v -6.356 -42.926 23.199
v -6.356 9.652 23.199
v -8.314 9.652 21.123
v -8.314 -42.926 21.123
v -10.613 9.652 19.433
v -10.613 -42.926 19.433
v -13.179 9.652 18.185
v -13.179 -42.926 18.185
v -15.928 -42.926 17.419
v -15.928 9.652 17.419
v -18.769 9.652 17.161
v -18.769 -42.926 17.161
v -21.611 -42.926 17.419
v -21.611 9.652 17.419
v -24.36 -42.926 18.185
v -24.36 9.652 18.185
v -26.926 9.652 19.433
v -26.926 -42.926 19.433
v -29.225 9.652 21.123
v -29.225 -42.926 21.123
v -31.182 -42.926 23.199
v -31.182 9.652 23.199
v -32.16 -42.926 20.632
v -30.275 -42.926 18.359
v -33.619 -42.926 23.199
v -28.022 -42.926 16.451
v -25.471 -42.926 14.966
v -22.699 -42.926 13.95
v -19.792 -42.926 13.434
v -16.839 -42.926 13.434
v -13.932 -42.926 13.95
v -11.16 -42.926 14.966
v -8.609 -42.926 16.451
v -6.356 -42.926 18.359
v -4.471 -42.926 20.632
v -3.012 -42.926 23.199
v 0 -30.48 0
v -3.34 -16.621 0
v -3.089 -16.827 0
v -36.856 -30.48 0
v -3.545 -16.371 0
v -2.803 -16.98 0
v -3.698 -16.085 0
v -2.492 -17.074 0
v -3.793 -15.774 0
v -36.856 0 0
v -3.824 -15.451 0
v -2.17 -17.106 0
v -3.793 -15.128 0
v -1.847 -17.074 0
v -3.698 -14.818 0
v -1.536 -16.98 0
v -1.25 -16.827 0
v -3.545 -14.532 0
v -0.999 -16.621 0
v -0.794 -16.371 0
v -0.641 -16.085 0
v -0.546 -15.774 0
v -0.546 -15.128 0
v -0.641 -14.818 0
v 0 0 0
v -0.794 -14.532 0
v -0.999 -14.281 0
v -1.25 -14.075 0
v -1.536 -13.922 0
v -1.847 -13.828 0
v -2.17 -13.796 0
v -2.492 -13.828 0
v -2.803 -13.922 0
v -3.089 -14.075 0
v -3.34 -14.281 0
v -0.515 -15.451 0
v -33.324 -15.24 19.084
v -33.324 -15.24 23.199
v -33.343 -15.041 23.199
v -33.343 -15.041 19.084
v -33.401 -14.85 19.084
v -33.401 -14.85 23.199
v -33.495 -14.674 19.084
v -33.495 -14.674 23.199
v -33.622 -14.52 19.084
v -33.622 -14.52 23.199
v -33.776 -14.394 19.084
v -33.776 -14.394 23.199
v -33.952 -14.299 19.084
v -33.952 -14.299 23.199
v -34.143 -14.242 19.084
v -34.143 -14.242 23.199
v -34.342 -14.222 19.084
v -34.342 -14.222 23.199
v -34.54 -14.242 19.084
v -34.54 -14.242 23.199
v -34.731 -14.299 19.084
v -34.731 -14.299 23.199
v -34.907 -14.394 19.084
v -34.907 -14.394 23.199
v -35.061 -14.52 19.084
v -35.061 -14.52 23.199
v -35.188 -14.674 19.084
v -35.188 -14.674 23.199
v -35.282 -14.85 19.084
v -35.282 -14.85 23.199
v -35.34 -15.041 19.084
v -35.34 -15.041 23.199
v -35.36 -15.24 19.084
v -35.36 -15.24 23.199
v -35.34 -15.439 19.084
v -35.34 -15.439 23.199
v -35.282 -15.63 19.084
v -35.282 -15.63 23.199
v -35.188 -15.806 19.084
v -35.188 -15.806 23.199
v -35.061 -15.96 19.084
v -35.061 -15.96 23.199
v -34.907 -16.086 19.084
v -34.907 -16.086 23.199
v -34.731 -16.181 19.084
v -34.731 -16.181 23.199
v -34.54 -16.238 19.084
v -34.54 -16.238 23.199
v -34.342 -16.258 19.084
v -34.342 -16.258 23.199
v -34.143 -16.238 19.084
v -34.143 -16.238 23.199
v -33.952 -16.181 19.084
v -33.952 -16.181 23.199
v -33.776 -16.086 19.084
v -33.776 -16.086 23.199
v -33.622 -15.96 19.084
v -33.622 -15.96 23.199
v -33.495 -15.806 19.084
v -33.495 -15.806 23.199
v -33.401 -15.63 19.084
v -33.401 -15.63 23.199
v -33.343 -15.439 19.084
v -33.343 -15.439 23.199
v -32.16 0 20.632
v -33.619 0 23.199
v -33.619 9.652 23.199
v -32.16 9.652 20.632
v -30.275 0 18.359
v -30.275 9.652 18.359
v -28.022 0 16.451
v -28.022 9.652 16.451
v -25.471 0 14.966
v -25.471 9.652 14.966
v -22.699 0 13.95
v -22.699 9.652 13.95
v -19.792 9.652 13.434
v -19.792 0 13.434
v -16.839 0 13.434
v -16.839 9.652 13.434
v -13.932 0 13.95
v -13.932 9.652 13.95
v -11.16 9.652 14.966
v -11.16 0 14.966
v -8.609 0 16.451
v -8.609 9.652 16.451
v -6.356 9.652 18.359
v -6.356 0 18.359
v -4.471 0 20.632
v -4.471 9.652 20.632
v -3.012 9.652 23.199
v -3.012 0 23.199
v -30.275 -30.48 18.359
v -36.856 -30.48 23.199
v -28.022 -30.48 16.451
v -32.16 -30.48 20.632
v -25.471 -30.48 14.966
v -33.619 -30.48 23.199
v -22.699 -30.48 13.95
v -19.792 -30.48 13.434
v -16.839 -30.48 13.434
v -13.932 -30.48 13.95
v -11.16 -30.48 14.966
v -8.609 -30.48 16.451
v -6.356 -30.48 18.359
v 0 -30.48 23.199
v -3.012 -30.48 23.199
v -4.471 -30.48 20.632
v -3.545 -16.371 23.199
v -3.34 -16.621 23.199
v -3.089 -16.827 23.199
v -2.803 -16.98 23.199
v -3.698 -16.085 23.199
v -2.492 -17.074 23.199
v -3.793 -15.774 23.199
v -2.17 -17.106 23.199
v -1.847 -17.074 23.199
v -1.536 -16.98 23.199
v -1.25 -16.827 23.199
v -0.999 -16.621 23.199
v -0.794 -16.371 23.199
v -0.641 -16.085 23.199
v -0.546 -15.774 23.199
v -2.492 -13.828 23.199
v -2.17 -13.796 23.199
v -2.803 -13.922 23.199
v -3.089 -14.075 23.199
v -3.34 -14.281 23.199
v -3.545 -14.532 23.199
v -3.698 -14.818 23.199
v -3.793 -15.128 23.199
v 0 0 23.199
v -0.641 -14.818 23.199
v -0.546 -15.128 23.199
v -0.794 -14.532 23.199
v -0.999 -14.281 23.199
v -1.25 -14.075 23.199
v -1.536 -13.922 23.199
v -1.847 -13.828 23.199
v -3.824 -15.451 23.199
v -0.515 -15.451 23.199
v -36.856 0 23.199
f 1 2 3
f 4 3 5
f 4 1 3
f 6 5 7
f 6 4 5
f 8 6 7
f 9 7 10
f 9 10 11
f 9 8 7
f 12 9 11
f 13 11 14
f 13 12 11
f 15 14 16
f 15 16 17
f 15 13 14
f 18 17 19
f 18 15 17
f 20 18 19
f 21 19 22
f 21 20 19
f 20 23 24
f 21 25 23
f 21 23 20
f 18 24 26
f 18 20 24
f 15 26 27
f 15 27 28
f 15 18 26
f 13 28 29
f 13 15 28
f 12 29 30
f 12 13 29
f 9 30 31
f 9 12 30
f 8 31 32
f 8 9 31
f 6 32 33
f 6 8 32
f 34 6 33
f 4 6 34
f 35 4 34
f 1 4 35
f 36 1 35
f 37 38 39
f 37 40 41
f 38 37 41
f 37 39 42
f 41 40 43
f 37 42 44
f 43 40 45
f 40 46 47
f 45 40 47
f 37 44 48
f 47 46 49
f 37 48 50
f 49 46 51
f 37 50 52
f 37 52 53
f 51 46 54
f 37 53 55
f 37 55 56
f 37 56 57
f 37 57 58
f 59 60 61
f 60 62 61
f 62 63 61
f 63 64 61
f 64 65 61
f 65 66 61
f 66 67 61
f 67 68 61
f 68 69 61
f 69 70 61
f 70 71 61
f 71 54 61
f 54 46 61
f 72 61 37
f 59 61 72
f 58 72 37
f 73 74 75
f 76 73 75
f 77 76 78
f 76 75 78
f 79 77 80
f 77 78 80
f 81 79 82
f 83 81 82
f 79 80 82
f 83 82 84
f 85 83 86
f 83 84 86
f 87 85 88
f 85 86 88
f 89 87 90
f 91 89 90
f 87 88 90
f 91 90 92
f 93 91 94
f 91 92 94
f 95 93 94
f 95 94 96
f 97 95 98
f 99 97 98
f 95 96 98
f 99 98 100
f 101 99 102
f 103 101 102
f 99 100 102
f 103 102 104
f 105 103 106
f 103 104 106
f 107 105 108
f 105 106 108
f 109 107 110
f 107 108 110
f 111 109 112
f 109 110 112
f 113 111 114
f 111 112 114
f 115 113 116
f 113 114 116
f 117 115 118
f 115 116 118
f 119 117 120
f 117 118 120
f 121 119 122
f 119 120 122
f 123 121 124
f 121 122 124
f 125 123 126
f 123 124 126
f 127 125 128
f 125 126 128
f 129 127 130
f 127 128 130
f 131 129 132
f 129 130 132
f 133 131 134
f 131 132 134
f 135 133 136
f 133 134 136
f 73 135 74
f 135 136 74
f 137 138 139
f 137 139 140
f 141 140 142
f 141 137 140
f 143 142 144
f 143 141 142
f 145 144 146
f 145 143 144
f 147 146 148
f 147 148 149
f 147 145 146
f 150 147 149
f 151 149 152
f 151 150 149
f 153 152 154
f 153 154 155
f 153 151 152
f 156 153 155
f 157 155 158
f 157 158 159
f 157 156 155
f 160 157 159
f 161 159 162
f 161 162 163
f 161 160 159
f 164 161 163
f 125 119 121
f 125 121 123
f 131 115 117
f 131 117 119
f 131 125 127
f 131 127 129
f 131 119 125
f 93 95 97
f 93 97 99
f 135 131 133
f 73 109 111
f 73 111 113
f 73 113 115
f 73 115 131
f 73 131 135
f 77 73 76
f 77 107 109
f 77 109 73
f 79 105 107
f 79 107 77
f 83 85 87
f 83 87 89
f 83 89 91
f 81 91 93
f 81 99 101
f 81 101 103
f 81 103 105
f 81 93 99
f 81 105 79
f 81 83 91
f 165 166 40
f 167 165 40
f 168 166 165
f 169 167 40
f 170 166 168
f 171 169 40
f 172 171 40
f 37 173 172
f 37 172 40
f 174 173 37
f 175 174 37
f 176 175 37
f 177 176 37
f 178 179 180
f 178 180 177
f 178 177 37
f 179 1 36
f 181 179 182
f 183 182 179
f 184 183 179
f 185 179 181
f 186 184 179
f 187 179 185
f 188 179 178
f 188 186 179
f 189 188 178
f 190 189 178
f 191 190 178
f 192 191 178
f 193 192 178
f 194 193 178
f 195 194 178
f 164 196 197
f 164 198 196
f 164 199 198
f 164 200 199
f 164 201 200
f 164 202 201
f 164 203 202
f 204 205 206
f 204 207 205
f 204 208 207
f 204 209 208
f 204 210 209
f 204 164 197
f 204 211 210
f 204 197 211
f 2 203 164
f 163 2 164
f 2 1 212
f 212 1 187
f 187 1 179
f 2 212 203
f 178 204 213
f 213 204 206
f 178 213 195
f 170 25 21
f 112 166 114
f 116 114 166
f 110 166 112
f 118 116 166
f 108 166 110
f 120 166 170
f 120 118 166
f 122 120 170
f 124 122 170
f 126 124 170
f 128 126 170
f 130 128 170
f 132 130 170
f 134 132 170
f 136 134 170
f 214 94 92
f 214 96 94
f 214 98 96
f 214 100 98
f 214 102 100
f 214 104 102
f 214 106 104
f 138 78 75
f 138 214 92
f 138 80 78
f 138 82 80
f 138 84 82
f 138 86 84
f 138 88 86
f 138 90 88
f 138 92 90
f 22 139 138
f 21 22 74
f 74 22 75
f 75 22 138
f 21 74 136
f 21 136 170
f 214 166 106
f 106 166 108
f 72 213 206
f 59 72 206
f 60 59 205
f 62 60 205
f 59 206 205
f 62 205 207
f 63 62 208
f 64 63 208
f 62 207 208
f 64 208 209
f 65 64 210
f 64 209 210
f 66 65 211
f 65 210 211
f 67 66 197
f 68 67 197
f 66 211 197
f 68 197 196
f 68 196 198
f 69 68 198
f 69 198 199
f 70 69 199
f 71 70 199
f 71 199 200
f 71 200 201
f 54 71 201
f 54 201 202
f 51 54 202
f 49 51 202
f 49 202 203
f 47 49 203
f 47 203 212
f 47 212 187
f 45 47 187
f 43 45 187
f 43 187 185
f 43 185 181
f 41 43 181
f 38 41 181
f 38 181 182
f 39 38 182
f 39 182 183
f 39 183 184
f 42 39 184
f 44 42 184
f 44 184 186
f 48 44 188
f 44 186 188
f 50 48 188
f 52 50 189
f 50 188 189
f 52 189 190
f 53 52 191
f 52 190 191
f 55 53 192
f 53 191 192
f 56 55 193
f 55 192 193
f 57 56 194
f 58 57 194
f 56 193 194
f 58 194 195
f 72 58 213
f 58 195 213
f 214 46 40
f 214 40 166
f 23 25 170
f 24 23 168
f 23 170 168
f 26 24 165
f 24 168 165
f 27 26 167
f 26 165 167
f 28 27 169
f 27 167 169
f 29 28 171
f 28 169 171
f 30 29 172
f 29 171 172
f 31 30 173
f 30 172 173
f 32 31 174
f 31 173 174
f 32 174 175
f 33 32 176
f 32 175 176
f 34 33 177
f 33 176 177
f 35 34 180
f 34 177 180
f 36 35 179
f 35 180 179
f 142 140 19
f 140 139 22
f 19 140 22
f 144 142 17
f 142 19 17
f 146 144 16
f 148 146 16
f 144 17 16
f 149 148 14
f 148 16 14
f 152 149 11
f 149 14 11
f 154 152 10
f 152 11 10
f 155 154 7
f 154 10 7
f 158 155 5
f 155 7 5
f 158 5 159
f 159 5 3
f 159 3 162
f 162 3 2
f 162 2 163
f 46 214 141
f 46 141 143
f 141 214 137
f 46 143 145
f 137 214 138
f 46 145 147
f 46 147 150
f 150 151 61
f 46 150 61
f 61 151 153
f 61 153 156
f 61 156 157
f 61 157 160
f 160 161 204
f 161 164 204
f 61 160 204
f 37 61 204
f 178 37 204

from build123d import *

# Parameters (mm, degrees)
F0_W     = 36.8556268513
F0_H     = 23.1989044696
F1_DEPTH = 30.48
F3_DEPTH = 40.132
F4_DEPTH = 52.578
F5_DEPTH = 77.978
F6_R     = 1.0180140376
F7_DEPTH = 4.1148
F8_R     = 1.6548537216
F9_DEPTH = 43.8912


with BuildPart() as f1:
    # F0 (on Front) → F1 (new body)
    with BuildSketch(Plane.XZ):
        with Locations((-18.4278134257, 11.5994522348)):
            Rectangle(F0_W, F0_H)
    extrude(amount=F1_DEPTH)

    # F2 (on face) → F3 (join)
    with BuildSketch(Plane.XZ.offset(30.48)):
        with BuildLine():
            ThreePointArc((-6.3564511947, 23.1989044696), (-18.7693366315, 17.1609803007), (-31.1822220683, 23.1989044696))
            Line((-31.1822220683, 23.1989044696), (-33.6186587811, 23.1989044696))
            ThreePointArc((-33.6186587811, 23.1989044696), (-18.3155420236, 13.3691620993), (-3.0124252662, 23.1989044696))
            Line((-3.0124252662, 23.1989044696), (-6.3564511947, 23.1989044696))
        make_face()
    extrude(amount=-F3_DEPTH)

    # F4 (add): a face of the model
    f4_faces = [f1.faces().sort_by_distance(p)[0] for p in [
        (-18.3155420236, 9.652, 13.690622107),
    ]]
    extrude(f4_faces, amount=-F4_DEPTH)

    # F5 (cut): a face of the model
    f5_faces = [f1.faces().sort_by_distance(p)[0] for p in [
        (-18.7693366315, -30.48, 20.7391498163),
    ]]
    extrude(f5_faces, amount=-F5_DEPTH, mode=Mode.SUBTRACT)

    # F6 (on face) → F7 (cut)
    with BuildSketch(Plane.XY.offset(23.1989044696)):
        with Locations((-34.3416407704, -15.24)):
            Circle(F6_R)
    extrude(amount=-F7_DEPTH, mode=Mode.SUBTRACT)

    # F8 (on face) → F9 (cut)
    with BuildSketch(Plane.XY.offset(23.1989044696)):
        with Locations((-2.1695073228, -15.4512235895)):
            Circle(F8_R)
    extrude(amount=-F9_DEPTH, mode=Mode.SUBTRACT)


solid = f1.part
